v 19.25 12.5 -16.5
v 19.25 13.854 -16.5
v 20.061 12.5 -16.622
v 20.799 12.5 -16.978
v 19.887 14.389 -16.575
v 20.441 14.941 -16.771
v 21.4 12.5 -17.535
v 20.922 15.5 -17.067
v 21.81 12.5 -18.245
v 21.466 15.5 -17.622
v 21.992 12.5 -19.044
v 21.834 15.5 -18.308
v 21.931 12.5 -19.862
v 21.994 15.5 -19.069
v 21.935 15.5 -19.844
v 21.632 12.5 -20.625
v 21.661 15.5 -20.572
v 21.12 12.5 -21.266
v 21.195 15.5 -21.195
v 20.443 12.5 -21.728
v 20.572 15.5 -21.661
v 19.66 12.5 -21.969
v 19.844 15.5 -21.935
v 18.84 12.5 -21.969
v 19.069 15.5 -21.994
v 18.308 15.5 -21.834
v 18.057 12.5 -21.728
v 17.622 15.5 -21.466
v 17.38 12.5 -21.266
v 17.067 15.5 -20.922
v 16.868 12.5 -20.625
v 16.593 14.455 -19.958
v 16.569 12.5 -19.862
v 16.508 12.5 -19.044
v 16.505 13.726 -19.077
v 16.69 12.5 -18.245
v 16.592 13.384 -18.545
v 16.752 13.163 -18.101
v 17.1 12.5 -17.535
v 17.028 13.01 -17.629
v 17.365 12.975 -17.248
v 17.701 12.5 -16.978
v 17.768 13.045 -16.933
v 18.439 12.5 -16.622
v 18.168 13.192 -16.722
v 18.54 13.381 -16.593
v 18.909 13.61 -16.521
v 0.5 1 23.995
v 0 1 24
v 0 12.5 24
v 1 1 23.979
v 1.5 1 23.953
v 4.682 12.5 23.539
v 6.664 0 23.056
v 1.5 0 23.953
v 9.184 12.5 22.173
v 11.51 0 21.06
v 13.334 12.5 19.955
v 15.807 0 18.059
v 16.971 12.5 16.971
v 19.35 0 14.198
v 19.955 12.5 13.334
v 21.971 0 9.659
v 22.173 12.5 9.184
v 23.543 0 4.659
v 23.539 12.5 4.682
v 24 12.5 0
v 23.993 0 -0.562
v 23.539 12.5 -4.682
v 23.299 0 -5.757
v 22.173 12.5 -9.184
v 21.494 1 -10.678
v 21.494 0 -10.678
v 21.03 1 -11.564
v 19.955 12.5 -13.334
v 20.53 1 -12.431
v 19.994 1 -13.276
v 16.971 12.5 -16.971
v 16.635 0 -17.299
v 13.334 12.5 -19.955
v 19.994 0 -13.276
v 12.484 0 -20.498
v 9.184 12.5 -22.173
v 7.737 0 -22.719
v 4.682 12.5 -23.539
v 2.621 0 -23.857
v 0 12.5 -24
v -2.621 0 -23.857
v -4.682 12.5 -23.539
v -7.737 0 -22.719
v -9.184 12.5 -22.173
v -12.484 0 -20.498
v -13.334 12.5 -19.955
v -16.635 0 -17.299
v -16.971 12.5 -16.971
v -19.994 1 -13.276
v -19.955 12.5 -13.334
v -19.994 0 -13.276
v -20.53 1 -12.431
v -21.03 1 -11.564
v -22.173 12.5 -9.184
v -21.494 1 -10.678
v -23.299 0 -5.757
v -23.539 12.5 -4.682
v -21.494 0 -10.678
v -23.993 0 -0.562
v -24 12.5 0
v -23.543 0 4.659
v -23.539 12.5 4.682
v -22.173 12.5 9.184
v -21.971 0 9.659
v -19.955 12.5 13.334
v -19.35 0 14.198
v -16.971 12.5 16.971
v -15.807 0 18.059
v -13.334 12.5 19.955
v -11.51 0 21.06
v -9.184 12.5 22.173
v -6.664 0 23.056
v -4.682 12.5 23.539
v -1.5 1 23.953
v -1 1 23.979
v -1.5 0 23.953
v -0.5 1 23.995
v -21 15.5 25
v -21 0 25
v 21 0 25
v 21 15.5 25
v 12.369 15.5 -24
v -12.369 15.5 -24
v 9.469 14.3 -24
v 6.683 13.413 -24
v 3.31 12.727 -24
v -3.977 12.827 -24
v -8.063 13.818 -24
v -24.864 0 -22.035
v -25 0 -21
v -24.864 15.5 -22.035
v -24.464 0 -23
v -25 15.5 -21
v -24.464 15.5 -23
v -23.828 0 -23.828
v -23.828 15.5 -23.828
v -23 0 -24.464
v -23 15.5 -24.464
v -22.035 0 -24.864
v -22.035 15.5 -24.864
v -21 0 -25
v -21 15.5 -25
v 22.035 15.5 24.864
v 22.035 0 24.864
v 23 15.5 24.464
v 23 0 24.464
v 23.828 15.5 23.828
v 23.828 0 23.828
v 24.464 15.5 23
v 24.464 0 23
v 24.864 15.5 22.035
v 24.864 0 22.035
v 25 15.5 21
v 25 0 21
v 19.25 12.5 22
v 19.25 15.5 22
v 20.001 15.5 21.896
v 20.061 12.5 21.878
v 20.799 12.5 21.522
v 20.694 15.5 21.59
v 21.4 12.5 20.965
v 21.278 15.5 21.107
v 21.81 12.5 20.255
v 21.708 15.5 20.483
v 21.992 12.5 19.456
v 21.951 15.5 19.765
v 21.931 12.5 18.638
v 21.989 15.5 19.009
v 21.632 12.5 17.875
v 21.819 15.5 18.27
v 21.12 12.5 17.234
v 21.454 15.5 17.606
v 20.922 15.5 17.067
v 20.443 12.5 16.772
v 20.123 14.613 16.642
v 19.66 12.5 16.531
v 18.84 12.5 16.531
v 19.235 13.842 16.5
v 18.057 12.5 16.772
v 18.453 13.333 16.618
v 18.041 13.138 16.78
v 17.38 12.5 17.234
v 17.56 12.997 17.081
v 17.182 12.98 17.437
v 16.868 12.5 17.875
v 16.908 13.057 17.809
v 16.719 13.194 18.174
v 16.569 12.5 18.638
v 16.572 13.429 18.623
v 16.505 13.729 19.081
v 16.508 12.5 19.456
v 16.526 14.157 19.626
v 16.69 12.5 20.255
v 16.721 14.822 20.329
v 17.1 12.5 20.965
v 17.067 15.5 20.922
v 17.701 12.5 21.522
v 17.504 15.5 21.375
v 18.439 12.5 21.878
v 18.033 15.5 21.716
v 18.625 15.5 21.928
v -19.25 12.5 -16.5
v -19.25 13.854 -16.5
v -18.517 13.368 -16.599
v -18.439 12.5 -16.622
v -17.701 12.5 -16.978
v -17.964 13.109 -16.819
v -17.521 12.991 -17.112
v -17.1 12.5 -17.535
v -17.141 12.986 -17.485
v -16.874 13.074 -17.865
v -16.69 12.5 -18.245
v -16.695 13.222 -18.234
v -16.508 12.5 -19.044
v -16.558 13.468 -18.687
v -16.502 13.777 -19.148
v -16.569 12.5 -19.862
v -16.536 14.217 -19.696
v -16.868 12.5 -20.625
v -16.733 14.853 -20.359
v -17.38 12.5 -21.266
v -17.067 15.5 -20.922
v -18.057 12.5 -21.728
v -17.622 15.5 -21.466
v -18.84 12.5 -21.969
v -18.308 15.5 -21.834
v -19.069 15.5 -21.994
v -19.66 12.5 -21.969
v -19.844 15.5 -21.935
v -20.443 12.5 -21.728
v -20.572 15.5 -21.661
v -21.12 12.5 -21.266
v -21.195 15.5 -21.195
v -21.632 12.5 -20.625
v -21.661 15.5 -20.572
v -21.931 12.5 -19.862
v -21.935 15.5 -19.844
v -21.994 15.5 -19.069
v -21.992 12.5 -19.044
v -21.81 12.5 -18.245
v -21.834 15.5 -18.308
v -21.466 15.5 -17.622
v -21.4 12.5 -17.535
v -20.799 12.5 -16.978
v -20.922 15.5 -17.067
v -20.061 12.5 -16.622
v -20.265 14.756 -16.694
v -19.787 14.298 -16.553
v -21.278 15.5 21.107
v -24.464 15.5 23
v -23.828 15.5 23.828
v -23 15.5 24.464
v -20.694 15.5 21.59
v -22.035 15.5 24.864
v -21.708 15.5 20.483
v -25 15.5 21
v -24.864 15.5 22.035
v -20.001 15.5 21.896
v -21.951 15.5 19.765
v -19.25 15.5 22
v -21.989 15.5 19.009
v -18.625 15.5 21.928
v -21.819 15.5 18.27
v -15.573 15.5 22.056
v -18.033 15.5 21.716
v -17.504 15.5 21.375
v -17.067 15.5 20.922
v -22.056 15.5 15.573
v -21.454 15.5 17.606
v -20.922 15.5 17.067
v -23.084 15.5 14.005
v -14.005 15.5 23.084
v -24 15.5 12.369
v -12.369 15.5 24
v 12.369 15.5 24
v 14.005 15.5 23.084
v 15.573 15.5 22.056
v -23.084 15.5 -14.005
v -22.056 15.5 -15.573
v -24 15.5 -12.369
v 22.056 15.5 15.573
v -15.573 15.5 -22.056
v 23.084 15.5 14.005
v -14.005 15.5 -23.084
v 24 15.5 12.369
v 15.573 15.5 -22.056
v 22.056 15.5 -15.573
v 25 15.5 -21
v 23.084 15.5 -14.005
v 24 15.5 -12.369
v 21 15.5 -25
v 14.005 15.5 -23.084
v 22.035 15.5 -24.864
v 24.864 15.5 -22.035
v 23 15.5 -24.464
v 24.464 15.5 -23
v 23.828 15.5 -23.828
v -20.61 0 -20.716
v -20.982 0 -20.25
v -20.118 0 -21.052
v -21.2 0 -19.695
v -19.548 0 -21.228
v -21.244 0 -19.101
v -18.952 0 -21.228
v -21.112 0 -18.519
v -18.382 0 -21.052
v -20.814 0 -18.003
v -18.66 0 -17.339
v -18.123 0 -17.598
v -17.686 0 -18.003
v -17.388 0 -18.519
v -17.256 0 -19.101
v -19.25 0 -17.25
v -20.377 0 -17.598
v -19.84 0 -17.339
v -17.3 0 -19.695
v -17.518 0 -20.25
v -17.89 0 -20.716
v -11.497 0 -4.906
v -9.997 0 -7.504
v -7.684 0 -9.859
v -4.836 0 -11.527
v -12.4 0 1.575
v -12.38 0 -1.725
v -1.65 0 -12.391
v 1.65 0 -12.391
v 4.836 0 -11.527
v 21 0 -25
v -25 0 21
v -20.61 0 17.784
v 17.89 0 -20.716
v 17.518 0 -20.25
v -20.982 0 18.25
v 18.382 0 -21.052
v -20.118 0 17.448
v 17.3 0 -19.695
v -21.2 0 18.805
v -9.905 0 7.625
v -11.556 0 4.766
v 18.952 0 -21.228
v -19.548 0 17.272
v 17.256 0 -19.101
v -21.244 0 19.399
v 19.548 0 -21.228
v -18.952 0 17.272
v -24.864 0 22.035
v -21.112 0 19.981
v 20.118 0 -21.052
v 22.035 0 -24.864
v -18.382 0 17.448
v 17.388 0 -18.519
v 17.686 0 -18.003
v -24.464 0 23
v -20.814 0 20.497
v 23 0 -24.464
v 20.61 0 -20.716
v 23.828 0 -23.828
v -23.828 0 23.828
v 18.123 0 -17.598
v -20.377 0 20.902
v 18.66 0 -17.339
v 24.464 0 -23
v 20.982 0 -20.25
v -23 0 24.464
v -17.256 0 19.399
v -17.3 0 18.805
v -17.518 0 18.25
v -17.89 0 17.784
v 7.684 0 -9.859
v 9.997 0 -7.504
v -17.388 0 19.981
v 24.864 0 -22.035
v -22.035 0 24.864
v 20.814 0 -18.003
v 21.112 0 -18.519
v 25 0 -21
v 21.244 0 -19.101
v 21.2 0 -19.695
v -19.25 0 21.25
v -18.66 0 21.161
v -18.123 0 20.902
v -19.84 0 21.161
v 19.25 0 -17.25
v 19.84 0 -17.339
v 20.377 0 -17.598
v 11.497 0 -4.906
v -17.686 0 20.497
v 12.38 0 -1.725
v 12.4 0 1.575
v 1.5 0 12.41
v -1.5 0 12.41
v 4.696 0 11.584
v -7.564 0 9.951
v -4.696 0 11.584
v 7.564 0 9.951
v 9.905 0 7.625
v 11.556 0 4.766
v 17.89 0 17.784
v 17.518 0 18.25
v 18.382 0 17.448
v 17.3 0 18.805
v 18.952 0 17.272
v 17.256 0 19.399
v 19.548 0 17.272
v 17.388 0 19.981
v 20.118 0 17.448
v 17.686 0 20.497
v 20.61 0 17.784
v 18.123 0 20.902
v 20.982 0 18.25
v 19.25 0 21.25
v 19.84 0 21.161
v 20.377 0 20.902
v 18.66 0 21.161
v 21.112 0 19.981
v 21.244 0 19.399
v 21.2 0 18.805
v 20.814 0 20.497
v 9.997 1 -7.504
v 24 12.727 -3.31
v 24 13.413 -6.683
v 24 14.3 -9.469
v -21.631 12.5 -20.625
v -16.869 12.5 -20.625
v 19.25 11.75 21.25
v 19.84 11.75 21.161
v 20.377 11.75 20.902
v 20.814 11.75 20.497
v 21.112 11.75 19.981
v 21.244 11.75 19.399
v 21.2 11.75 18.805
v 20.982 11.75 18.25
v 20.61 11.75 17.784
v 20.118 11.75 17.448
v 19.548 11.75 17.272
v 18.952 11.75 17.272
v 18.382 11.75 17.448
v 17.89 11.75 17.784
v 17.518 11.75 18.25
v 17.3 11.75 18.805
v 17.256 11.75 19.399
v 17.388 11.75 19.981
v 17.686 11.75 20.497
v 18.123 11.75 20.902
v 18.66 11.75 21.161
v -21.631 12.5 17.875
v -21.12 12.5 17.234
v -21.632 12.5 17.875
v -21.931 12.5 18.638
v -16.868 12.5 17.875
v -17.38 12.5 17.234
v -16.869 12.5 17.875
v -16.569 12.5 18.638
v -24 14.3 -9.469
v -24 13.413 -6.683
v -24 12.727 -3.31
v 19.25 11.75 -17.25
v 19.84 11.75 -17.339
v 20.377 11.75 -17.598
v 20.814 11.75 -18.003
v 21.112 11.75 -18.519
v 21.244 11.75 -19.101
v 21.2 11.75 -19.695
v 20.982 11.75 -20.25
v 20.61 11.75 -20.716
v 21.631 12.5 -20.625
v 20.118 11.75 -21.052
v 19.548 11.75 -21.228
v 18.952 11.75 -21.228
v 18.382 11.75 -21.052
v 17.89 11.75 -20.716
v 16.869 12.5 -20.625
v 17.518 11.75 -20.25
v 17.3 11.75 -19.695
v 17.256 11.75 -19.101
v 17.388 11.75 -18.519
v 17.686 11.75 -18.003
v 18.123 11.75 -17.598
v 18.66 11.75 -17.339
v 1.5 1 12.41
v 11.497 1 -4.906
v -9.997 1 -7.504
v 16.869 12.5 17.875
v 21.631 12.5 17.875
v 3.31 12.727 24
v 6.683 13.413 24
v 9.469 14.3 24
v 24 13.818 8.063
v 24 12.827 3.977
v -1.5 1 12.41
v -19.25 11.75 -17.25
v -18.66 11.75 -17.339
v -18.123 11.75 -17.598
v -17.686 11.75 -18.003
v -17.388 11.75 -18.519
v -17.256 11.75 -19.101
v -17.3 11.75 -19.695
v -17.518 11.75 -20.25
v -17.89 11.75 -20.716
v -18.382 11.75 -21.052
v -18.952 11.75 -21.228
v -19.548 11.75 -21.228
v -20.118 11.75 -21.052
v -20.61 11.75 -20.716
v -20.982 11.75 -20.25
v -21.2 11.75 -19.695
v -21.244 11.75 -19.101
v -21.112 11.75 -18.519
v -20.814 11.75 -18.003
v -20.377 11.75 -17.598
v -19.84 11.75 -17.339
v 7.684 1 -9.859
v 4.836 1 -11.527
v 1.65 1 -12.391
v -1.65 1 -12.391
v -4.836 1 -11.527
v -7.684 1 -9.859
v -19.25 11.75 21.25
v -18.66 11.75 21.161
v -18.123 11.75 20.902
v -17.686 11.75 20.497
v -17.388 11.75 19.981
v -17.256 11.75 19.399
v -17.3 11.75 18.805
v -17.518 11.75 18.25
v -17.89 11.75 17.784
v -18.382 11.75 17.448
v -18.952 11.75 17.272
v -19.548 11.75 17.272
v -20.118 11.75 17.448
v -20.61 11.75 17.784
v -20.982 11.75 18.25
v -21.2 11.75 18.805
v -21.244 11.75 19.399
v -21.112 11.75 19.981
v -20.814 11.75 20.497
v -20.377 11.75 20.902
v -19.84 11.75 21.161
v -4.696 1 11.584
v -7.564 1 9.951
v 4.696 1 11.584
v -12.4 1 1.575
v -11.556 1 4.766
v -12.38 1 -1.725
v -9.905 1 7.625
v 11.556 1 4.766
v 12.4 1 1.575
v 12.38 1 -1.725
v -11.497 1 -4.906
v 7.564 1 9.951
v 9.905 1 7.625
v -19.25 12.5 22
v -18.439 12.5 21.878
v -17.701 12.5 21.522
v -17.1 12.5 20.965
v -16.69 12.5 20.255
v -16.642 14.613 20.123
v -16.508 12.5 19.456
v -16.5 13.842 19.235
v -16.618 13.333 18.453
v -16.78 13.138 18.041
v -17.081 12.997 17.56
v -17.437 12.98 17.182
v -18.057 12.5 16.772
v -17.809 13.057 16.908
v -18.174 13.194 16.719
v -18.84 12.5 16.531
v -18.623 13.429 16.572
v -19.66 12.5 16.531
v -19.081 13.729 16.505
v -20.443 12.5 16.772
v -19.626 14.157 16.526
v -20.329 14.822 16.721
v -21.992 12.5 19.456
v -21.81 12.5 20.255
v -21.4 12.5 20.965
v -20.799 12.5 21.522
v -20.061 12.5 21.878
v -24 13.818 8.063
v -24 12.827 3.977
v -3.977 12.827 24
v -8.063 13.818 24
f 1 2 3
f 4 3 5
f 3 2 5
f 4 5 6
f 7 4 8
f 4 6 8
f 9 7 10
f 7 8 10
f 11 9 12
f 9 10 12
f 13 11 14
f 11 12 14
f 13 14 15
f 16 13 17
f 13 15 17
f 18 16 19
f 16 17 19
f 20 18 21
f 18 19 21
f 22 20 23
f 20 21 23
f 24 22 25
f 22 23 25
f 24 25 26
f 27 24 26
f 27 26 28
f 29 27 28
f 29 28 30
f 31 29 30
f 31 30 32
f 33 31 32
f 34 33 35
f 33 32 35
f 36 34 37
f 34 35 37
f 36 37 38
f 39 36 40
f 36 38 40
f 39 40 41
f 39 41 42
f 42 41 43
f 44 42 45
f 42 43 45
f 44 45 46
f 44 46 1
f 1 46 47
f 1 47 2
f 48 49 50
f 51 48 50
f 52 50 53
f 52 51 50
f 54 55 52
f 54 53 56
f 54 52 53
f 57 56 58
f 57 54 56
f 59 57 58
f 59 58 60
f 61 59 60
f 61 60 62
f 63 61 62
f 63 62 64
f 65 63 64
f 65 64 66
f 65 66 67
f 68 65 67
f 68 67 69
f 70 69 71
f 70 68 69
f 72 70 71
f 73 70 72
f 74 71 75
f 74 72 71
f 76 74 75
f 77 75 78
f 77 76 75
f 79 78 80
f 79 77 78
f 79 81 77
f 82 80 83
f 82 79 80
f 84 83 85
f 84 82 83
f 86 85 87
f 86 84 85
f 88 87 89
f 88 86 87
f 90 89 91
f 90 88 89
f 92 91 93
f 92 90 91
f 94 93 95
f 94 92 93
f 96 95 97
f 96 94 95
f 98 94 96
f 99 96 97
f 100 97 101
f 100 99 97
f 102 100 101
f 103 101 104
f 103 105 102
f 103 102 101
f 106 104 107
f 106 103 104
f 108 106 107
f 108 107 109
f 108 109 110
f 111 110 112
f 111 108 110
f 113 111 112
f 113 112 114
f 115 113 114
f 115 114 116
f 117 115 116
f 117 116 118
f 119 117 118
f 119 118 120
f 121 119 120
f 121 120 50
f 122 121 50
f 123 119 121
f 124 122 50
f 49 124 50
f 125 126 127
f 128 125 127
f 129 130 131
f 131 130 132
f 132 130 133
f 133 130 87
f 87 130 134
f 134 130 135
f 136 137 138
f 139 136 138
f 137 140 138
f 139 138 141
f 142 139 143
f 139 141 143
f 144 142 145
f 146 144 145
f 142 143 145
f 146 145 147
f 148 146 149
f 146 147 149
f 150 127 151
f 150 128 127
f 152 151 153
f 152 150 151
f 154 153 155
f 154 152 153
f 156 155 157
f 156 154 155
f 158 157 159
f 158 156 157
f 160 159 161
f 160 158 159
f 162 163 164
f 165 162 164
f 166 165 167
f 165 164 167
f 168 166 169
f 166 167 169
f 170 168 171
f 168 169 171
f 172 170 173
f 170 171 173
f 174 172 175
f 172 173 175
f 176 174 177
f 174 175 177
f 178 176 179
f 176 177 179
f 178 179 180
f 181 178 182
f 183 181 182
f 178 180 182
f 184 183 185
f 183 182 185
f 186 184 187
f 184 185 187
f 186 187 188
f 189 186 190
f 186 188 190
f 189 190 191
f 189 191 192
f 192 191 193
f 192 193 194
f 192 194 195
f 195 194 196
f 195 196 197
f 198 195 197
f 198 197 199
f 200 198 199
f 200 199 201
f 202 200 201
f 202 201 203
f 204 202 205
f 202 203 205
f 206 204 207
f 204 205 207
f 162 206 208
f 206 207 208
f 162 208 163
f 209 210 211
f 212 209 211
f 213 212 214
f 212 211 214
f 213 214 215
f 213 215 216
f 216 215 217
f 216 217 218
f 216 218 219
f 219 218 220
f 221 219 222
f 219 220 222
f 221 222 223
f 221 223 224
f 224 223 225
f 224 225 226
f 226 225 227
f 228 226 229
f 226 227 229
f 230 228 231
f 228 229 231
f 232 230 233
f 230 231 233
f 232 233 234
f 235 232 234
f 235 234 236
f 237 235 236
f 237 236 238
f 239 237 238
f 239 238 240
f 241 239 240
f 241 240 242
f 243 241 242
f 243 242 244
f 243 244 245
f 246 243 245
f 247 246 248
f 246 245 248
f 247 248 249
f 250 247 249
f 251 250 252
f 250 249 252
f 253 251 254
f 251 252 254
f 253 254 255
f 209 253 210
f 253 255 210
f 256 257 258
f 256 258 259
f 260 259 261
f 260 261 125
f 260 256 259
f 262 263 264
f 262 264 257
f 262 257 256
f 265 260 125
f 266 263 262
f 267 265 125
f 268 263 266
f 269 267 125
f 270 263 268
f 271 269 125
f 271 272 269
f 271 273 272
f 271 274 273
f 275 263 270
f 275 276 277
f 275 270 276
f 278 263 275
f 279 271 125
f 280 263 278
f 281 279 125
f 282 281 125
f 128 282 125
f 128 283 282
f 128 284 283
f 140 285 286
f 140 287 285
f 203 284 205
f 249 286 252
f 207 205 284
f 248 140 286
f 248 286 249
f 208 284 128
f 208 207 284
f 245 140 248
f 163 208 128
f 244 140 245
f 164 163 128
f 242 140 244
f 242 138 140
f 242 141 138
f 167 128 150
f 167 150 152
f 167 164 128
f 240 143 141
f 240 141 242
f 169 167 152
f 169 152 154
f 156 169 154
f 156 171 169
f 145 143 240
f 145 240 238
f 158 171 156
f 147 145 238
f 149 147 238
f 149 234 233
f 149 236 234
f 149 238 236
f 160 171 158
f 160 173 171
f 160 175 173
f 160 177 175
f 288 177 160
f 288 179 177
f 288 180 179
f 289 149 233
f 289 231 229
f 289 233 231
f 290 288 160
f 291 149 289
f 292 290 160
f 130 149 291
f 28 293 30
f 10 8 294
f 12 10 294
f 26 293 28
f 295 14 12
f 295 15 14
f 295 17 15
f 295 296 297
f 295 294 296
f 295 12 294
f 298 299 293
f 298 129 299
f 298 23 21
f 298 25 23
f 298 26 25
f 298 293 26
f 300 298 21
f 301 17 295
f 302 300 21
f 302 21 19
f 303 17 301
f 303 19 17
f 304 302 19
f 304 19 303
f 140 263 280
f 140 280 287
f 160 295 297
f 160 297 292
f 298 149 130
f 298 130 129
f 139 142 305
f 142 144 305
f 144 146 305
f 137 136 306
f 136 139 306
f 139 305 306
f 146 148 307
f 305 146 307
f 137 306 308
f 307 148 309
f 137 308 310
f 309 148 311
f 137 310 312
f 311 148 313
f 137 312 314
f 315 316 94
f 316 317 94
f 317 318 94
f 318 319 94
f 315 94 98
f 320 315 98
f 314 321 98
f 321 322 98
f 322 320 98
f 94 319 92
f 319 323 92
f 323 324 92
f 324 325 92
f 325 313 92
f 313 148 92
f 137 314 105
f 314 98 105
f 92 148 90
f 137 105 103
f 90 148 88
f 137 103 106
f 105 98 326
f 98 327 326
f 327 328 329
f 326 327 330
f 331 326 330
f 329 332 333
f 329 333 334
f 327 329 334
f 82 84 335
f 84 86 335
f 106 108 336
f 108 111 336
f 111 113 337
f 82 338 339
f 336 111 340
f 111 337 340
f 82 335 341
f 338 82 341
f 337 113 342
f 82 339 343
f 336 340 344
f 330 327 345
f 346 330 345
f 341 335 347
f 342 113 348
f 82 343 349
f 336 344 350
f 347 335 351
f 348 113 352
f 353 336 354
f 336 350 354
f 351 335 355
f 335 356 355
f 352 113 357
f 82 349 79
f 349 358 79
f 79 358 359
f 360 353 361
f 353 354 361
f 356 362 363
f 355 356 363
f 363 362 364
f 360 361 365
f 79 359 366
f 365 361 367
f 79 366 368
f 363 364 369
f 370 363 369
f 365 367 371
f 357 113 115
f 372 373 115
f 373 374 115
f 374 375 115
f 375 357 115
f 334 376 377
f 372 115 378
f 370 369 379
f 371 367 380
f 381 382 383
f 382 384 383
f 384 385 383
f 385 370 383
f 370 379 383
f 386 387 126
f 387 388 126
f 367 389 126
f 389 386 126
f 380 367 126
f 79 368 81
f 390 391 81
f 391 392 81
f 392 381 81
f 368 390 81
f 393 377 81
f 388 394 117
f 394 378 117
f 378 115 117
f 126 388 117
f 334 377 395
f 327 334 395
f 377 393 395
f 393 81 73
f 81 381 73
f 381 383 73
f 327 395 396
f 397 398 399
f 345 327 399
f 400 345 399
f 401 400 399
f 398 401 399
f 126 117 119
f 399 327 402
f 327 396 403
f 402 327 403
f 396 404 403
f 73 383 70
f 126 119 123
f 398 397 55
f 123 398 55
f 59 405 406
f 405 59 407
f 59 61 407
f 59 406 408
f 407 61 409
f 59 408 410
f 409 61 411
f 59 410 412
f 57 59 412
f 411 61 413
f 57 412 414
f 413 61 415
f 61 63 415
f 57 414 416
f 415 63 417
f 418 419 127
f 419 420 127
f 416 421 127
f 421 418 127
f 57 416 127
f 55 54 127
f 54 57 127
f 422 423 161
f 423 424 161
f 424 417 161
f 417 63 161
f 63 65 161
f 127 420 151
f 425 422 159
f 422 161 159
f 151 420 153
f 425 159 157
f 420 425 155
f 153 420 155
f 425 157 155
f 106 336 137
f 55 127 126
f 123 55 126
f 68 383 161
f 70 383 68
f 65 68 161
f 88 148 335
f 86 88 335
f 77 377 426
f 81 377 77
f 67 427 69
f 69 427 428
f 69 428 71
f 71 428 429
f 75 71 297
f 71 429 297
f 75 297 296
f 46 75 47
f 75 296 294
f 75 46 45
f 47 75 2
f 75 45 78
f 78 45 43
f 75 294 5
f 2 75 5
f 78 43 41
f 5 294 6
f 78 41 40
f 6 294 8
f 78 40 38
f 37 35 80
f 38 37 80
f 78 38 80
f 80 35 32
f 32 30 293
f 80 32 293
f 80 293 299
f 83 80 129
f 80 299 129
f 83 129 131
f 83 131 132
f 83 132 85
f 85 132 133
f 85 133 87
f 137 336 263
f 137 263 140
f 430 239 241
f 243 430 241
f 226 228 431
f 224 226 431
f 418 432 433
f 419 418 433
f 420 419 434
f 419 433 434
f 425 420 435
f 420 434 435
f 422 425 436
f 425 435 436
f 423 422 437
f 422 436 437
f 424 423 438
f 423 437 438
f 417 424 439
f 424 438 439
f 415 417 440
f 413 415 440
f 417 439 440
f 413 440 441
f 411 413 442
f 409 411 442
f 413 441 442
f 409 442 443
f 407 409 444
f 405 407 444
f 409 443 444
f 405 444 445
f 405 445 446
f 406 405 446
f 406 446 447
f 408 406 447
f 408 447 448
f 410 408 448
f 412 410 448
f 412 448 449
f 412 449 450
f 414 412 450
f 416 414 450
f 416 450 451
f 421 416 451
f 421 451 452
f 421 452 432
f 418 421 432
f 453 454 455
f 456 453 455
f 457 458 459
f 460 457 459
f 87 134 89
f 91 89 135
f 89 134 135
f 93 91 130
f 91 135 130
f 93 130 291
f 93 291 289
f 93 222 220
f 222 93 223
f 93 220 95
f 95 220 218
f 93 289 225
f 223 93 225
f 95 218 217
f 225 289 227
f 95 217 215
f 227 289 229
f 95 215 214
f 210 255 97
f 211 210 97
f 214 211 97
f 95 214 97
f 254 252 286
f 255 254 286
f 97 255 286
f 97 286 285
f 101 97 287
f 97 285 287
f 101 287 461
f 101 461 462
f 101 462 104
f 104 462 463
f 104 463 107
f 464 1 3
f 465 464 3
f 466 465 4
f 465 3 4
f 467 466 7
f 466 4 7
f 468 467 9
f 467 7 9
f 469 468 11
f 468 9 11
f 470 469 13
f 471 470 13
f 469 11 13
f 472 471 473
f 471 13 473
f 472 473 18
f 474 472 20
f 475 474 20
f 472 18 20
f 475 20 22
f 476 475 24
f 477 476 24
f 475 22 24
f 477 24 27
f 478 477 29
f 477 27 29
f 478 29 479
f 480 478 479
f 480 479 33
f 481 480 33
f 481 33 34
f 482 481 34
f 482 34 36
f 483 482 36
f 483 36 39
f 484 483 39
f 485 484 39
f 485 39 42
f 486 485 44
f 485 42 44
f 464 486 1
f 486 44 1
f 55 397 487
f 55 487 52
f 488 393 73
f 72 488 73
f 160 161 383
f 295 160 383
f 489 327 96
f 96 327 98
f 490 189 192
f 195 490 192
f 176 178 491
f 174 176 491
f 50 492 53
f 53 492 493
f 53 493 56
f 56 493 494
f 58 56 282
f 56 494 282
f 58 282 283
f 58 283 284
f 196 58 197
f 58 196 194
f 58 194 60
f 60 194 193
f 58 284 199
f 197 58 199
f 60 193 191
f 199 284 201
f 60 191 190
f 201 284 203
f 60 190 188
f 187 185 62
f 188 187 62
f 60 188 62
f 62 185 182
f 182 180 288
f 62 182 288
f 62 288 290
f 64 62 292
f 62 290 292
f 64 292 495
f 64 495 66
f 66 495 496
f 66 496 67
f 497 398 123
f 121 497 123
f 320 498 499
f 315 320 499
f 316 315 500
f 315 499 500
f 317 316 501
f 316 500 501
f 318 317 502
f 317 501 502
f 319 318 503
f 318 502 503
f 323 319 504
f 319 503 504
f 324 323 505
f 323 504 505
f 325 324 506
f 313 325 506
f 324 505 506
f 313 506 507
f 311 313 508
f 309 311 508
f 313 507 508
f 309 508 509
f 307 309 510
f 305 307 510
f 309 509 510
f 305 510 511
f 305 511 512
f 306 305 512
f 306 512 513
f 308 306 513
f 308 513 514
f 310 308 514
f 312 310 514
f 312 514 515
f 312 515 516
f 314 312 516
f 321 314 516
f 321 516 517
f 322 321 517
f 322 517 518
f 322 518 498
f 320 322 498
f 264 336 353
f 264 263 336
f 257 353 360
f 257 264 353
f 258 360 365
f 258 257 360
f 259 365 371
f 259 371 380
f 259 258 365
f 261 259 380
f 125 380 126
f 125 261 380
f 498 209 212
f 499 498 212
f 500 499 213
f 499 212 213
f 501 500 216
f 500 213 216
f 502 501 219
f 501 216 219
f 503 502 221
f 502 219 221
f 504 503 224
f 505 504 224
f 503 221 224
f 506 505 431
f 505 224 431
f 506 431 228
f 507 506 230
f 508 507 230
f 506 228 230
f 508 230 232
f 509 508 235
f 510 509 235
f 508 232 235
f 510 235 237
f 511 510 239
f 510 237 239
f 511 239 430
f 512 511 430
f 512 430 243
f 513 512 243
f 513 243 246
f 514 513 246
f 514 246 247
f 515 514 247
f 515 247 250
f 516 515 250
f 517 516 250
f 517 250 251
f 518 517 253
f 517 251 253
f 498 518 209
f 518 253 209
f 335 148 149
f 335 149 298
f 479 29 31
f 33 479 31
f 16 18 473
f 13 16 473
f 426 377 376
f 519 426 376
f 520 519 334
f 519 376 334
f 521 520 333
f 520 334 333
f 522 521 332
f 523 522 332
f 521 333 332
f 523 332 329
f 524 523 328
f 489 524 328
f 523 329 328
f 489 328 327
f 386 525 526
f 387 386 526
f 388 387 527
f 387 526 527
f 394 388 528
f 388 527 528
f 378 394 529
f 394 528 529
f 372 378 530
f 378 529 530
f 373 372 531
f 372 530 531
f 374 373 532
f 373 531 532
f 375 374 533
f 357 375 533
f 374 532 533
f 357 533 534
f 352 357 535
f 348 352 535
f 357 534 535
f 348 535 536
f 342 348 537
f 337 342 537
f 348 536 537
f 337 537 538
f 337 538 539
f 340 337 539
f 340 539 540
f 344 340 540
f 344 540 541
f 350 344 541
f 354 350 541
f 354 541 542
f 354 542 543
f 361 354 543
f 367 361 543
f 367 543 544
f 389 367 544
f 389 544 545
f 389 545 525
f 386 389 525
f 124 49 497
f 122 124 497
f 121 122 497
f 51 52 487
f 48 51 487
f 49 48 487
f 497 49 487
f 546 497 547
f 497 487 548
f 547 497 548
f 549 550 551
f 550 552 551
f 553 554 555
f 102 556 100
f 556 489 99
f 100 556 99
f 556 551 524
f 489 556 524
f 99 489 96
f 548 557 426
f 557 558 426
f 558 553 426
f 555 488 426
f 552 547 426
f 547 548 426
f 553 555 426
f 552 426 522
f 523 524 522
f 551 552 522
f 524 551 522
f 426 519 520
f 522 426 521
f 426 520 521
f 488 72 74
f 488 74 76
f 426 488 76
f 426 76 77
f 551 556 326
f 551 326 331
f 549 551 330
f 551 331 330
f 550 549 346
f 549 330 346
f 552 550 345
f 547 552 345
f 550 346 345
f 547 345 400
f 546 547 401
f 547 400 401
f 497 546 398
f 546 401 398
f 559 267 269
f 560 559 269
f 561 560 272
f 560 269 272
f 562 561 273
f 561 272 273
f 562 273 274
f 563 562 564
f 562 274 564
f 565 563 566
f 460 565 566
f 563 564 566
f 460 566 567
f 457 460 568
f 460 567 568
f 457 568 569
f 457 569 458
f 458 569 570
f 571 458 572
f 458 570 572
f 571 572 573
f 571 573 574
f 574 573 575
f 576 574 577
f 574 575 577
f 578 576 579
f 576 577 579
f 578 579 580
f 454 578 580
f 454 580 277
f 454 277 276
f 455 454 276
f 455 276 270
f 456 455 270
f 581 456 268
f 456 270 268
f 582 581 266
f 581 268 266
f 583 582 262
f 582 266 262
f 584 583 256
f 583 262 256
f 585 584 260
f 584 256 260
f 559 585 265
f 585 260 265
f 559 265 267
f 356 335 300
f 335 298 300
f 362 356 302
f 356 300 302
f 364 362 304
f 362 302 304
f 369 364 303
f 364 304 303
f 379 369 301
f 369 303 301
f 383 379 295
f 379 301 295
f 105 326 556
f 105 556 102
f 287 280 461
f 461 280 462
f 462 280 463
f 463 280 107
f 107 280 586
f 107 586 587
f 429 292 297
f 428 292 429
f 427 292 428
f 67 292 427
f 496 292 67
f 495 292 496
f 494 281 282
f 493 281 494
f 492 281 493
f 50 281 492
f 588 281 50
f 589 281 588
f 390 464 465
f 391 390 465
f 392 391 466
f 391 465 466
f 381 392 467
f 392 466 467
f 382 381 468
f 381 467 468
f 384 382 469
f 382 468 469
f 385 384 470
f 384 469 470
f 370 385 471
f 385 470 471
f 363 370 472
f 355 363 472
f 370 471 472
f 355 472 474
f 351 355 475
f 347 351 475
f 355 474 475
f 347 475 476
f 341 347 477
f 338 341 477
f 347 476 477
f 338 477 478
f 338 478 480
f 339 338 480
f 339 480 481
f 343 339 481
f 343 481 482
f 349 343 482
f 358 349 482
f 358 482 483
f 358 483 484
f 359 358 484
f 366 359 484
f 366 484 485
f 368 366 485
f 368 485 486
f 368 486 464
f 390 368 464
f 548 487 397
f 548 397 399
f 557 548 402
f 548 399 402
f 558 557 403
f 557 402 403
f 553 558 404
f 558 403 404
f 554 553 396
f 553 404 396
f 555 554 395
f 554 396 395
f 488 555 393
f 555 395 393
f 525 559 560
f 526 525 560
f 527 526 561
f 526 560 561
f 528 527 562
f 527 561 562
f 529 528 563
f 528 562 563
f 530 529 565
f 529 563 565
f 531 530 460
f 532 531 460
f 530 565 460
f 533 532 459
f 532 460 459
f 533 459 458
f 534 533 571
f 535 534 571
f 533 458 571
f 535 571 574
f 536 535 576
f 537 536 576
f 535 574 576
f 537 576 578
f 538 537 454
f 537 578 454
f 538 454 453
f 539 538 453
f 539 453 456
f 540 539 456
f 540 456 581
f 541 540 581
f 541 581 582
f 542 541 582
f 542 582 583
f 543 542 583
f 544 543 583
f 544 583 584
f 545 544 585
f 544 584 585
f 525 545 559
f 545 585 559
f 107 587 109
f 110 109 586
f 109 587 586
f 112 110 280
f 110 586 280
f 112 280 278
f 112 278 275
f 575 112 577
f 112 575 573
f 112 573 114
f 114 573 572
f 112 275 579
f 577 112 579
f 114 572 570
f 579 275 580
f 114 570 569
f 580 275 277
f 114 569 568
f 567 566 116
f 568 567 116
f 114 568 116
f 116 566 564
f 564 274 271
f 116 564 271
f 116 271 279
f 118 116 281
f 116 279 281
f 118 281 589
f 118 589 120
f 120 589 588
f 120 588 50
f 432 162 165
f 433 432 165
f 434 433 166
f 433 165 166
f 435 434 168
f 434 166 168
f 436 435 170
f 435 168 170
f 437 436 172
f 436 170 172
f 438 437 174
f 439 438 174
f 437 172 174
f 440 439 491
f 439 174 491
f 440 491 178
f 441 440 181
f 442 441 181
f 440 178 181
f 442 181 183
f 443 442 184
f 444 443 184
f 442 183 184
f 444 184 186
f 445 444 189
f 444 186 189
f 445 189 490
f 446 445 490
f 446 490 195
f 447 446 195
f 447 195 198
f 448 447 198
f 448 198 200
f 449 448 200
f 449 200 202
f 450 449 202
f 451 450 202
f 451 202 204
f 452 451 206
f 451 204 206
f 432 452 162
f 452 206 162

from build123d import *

# Parameters (mm, degrees)
SKETCH1_W           = 50
SKETCH1_H           = 50
SKETCH1_R           = 24
BOSS_EXTRUDE1_DEPTH = 15.5
CHAMFER1_SIZE       = 3
SKETCH4_W           = 50
SKETCH4_H           = 50
SKETCH4_W_2         = 48
SKETCH4_H_2         = 48
BOSS_EXTRUDE2_DEPTH = 15.5
SKETCH5_R           = 2.75
CUT_EXTRUDE1_DEPTH  = 3
FILLET1_R           = 4
SKETCH6_R           = 12.5
BOSS_EXTRUDE5_DEPTH = 1
SKETCH7_R           = 2
CUT_EXTRUDE2_DEPTH  = 21
CHAMFER3_SIZE       = 0.75
SKETCH9_W           = 3
SKETCH9_H           = 24
BOSS_EXTRUDE6_DEPTH = 1
CIRPATTERN1_COUNT   = 3


# Some blends are built 0.0001 mm under size
with BuildPart() as part:
    # Sketch1 → Boss-Extrude1 (new body)
    with BuildSketch(Plane(origin=(0, 0, 0), x_dir=(1, 0, 0), z_dir=(0, 1, 0))):
        Rectangle(SKETCH1_W, SKETCH1_H)
        with Locations(Location((0, 0, 0), (0, 0, 270))):
            Circle(SKETCH1_R, mode=Mode.SUBTRACT)
    extrude(amount=BOSS_EXTRUDE1_DEPTH)

    # Chamfer1
    # the kernel refuses this chamfer: 3 mm, written as the material it takes off along each edge
    with BuildSketch(Plane(origin=(0, 15.5, 0), x_dir=(0, 0, 1), z_dir=(-1, 0, 0))) as chamfer1_piece_1:
        Polygon((24, -CHAMFER1_SIZE), (24 + CHAMFER1_SIZE, 0), (24, 0), align=None)
    revolve(axis=Axis((0, 15.5, 0), (0, 1, 0)), mode=Mode.SUBTRACT)

    # Sketch4 → Boss-Extrude2 (add)
    with BuildSketch(Plane(origin=(0, 15.5, 0), x_dir=(1, 0, 0), z_dir=(0, 1, 0))):
        Rectangle(SKETCH4_W, SKETCH4_H)
        Rectangle(SKETCH4_W_2, SKETCH4_H_2, mode=Mode.SUBTRACT)
    extrude(amount=-BOSS_EXTRUDE2_DEPTH)

    # Sketch5 → Cut-Extrude1 (cut)
    with BuildSketch(Plane(origin=(0, 15.5, 0), x_dir=(1, 0, 0), z_dir=(0, 1, 0))):
        with Locations(Location((-19.25, 19.25, 0), (0, 0, 270))):
            Circle(SKETCH5_R)
        with Locations(Location((19.25, 19.25, 0), (0, 0, 270))):
            Circle(SKETCH5_R)
        with Locations(Location((19.25, -19.25, 0), (0, 0, 270))):
            Circle(SKETCH5_R)
        with Locations(Location((-19.25, -19.25, 0), (0, 0, 270))):
            Circle(SKETCH5_R)
    extrude(amount=-CUT_EXTRUDE1_DEPTH, mode=Mode.SUBTRACT)

    # Fillet1
    fillet1_edges = [part.edges().sort_by_distance(p)[0] for p in [
        (-25, 7.75, -25),
        (25, 7.75, -25),
        (25, 7.75, 25),
        (-25, 7.75, 25),
    ]]
    fillet(fillet1_edges, radius=FILLET1_R)

    # Sketch7 → Cut-Extrude2 (cut)
    with BuildSketch(Plane(origin=(0, 12.5, 0), x_dir=(1, 0, 0), z_dir=(0, 1, 0))):
        with Locations(Location((-19.25, 19.25, 0), (0, 0, 270))):
            Circle(SKETCH7_R)
        with Locations(Location((-19.25, -19.25, 0), (0, 0, 270))):
            Circle(SKETCH7_R)
        with Locations(Location((19.25, -19.25, 0), (0, 0, 270))):
            Circle(SKETCH7_R)
        with Locations(Location((19.25, 19.25, 0), (0, 0, 270))):
            Circle(SKETCH7_R)
    extrude(amount=-CUT_EXTRUDE2_DEPTH, mode=Mode.SUBTRACT)

    # Chamfer3
    chamfer3_edges = [part.edges().sort_by_distance(p)[0] for p in [
        (-19.25, 12.5, -21.25),
        (-19.25, 12.5, 17.25),
        (19.25, 12.5, 17.25),
        (19.25, 12.5, -21.25),
    ]]
    chamfer(chamfer3_edges, length=CHAMFER3_SIZE - 0.0001)  # a hair under: the kernel refuses the full size



with BuildPart() as body_2:
    # Sketch6 → Boss-Extrude5 (new body)
    with BuildSketch(Plane(origin=(0, 0, 0), x_dir=(1, 0, 0), z_dir=(0, 1, 0))):
        with Locations(Location((0, 0, 0), (0, 0, 270))):
            Circle(SKETCH6_R)
    extrude(amount=BOSS_EXTRUDE5_DEPTH)


with BuildPart() as part_1:
    add(part.part)

    add(body_2.part)  # Boss-Extrude6 merges body 2
    # Sketch9 → Boss-Extrude6 (add)
    with BuildSketch(Plane.XZ):
        with Locations((0, 12.5)):
            Rectangle(SKETCH9_W, SKETCH9_H)
    boss_extrude6 = extrude(amount=-BOSS_EXTRUDE6_DEPTH)

    # CirPattern1: Boss-Extrude6 ×3 about axis
    cirpattern1_axis = Axis((0, 0, 0), (0, 1, 0))
    for i in range(1, CIRPATTERN1_COUNT):
        add(boss_extrude6.rotate(cirpattern1_axis, i * 360 / CIRPATTERN1_COUNT))


solid = part_1.part
